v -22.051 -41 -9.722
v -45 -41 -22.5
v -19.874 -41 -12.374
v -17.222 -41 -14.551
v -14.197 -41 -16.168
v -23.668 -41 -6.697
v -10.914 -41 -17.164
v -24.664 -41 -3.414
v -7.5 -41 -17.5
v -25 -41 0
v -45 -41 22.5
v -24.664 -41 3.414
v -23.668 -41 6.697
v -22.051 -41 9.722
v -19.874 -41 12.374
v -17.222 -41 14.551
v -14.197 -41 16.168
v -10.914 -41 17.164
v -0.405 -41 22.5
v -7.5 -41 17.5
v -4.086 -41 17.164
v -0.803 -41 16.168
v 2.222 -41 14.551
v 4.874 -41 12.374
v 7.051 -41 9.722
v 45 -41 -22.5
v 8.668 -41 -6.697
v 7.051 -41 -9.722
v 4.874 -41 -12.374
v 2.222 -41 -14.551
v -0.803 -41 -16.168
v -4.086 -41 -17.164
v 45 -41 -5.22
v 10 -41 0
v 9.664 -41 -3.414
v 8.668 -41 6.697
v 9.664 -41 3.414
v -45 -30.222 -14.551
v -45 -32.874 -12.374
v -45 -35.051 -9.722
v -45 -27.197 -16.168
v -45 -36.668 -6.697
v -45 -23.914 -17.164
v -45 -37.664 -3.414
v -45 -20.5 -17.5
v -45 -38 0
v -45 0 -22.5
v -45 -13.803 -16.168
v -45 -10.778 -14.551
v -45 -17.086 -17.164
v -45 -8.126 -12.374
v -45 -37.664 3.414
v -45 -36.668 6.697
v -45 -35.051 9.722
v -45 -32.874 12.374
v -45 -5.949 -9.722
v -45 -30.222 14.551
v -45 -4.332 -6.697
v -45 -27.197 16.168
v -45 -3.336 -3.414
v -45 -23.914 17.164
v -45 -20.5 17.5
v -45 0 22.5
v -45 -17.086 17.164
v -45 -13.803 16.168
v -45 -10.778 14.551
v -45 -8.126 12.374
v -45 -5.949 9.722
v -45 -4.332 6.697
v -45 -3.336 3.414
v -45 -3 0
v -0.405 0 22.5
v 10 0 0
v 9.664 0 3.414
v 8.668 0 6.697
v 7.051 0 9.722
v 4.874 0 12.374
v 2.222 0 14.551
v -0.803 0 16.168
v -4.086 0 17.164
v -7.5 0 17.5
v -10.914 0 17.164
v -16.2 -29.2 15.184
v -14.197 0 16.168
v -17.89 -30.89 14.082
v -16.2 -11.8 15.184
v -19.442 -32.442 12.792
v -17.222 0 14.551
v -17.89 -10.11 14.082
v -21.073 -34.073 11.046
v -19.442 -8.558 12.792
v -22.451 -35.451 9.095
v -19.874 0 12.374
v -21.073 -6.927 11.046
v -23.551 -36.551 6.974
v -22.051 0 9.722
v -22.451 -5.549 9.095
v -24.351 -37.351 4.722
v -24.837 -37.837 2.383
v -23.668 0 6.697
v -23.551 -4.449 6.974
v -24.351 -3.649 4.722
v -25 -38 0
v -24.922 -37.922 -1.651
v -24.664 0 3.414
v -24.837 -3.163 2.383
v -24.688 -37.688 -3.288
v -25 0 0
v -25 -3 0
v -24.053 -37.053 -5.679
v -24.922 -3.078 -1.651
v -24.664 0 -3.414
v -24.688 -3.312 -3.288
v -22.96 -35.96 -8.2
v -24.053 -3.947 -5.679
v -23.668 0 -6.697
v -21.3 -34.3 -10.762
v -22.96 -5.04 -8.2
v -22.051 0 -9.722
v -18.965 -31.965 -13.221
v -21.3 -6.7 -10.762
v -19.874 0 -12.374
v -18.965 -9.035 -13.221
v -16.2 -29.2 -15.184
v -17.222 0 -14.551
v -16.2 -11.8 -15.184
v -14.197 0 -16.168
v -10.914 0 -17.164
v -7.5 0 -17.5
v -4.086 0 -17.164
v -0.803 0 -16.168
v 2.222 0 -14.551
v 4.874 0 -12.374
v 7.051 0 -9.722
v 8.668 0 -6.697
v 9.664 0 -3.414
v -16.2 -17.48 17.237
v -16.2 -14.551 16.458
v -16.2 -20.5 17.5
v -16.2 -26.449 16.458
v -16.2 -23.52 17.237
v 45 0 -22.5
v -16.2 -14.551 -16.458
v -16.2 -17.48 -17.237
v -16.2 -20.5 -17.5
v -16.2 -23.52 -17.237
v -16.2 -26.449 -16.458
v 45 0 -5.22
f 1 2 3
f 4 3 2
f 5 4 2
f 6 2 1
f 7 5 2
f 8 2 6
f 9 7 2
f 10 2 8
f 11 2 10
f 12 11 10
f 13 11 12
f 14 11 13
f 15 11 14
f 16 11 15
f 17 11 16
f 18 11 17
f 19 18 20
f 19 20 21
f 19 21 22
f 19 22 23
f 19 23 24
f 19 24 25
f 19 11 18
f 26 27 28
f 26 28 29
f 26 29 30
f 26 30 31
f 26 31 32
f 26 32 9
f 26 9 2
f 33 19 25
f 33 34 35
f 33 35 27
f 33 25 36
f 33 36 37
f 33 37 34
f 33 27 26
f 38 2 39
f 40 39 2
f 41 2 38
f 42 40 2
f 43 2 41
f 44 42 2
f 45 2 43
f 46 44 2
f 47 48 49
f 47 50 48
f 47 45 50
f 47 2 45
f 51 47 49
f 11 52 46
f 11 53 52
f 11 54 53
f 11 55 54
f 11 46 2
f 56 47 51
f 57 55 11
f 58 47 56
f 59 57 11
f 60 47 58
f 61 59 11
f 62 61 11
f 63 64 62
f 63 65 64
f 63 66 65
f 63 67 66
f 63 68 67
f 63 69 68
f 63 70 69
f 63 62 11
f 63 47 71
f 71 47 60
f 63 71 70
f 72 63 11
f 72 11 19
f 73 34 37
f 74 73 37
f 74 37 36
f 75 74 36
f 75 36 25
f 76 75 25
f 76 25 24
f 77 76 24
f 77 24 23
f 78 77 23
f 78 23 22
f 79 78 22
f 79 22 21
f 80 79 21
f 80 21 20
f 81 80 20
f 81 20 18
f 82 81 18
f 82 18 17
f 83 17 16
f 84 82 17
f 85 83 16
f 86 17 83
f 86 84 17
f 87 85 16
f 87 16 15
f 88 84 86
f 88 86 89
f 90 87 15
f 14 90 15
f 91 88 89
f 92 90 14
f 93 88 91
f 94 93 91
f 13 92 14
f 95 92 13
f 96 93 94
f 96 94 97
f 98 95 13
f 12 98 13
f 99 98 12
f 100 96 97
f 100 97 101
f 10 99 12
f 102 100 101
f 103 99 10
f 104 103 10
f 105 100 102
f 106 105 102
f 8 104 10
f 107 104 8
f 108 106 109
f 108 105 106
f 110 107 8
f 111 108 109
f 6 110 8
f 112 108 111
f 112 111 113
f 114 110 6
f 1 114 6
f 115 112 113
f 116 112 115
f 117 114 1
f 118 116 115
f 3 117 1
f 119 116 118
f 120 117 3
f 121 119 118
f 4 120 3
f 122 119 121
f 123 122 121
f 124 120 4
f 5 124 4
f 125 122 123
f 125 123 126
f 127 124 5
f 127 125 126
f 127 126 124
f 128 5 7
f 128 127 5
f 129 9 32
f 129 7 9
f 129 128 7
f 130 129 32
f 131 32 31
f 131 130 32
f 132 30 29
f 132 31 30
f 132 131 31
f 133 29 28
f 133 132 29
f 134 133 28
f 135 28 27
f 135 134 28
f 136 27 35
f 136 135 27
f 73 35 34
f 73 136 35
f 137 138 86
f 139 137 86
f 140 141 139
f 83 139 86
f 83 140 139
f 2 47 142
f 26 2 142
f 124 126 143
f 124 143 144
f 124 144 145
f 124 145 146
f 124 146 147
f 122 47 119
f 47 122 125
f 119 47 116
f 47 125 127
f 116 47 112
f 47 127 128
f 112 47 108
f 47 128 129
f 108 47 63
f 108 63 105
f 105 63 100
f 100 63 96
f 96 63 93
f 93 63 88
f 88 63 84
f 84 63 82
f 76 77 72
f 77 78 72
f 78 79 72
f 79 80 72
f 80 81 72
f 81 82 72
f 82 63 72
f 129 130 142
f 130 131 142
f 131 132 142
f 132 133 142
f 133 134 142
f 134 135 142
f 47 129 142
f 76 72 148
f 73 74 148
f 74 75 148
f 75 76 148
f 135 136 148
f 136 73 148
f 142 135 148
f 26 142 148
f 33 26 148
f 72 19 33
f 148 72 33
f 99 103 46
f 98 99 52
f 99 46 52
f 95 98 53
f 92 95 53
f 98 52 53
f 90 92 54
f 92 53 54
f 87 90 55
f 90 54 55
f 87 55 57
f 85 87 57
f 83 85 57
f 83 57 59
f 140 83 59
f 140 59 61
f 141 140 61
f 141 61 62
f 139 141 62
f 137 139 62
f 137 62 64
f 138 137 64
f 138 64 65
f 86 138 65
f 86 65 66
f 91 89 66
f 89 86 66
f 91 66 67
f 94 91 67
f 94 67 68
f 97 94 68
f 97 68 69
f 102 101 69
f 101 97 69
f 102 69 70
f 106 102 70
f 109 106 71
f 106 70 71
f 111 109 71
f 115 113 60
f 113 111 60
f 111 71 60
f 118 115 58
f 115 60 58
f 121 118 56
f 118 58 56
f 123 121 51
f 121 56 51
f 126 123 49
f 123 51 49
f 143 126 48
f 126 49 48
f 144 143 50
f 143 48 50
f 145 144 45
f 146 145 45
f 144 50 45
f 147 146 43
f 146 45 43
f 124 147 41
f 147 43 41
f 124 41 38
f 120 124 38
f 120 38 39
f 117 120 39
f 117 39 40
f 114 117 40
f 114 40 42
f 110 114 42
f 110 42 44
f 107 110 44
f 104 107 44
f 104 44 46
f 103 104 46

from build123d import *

# Parameters (mm, degrees)
F0_W     = 90
F0_H     = 45
F1_DEPTH = 41
F2_R     = 17.5
F3_DEPTH = 80.040589
F5_DEPTH = 60
F6_R     = 17.5
F7_DEPTH = 28.8


with BuildPart() as f1:
    # F0 (on Front) → F1 (new body)
    with BuildSketch(Plane.XZ):
        Rectangle(F0_W, F0_H)
    extrude(amount=F1_DEPTH)

    # F2 (on Front) → F3 (cut)
    with BuildSketch(Plane.XZ):
        with Locations((-7.5, 0)):
            Circle(F2_R)
    extrude(amount=F3_DEPTH, mode=Mode.SUBTRACT)

    # F4 (on face) → F5 (cut, symmetric)
    with BuildSketch(Plane.XZ):
        Polygon((-20.405538, 34.710526), (50.253086, -8.42718), (50.312012, 38.423195), align=None)
    extrude(amount=F5_DEPTH, both=True, mode=Mode.SUBTRACT)

    # F6 (on face) → F7 (cut)
    with BuildSketch(Plane(origin=(-45, 0, 0), x_dir=(0, -1, 0), z_dir=(-1, 0, 0))):
        with Locations((20.5, 0)):
            Circle(F6_R)
    extrude(amount=-F7_DEPTH, mode=Mode.SUBTRACT)


solid = f1.part
